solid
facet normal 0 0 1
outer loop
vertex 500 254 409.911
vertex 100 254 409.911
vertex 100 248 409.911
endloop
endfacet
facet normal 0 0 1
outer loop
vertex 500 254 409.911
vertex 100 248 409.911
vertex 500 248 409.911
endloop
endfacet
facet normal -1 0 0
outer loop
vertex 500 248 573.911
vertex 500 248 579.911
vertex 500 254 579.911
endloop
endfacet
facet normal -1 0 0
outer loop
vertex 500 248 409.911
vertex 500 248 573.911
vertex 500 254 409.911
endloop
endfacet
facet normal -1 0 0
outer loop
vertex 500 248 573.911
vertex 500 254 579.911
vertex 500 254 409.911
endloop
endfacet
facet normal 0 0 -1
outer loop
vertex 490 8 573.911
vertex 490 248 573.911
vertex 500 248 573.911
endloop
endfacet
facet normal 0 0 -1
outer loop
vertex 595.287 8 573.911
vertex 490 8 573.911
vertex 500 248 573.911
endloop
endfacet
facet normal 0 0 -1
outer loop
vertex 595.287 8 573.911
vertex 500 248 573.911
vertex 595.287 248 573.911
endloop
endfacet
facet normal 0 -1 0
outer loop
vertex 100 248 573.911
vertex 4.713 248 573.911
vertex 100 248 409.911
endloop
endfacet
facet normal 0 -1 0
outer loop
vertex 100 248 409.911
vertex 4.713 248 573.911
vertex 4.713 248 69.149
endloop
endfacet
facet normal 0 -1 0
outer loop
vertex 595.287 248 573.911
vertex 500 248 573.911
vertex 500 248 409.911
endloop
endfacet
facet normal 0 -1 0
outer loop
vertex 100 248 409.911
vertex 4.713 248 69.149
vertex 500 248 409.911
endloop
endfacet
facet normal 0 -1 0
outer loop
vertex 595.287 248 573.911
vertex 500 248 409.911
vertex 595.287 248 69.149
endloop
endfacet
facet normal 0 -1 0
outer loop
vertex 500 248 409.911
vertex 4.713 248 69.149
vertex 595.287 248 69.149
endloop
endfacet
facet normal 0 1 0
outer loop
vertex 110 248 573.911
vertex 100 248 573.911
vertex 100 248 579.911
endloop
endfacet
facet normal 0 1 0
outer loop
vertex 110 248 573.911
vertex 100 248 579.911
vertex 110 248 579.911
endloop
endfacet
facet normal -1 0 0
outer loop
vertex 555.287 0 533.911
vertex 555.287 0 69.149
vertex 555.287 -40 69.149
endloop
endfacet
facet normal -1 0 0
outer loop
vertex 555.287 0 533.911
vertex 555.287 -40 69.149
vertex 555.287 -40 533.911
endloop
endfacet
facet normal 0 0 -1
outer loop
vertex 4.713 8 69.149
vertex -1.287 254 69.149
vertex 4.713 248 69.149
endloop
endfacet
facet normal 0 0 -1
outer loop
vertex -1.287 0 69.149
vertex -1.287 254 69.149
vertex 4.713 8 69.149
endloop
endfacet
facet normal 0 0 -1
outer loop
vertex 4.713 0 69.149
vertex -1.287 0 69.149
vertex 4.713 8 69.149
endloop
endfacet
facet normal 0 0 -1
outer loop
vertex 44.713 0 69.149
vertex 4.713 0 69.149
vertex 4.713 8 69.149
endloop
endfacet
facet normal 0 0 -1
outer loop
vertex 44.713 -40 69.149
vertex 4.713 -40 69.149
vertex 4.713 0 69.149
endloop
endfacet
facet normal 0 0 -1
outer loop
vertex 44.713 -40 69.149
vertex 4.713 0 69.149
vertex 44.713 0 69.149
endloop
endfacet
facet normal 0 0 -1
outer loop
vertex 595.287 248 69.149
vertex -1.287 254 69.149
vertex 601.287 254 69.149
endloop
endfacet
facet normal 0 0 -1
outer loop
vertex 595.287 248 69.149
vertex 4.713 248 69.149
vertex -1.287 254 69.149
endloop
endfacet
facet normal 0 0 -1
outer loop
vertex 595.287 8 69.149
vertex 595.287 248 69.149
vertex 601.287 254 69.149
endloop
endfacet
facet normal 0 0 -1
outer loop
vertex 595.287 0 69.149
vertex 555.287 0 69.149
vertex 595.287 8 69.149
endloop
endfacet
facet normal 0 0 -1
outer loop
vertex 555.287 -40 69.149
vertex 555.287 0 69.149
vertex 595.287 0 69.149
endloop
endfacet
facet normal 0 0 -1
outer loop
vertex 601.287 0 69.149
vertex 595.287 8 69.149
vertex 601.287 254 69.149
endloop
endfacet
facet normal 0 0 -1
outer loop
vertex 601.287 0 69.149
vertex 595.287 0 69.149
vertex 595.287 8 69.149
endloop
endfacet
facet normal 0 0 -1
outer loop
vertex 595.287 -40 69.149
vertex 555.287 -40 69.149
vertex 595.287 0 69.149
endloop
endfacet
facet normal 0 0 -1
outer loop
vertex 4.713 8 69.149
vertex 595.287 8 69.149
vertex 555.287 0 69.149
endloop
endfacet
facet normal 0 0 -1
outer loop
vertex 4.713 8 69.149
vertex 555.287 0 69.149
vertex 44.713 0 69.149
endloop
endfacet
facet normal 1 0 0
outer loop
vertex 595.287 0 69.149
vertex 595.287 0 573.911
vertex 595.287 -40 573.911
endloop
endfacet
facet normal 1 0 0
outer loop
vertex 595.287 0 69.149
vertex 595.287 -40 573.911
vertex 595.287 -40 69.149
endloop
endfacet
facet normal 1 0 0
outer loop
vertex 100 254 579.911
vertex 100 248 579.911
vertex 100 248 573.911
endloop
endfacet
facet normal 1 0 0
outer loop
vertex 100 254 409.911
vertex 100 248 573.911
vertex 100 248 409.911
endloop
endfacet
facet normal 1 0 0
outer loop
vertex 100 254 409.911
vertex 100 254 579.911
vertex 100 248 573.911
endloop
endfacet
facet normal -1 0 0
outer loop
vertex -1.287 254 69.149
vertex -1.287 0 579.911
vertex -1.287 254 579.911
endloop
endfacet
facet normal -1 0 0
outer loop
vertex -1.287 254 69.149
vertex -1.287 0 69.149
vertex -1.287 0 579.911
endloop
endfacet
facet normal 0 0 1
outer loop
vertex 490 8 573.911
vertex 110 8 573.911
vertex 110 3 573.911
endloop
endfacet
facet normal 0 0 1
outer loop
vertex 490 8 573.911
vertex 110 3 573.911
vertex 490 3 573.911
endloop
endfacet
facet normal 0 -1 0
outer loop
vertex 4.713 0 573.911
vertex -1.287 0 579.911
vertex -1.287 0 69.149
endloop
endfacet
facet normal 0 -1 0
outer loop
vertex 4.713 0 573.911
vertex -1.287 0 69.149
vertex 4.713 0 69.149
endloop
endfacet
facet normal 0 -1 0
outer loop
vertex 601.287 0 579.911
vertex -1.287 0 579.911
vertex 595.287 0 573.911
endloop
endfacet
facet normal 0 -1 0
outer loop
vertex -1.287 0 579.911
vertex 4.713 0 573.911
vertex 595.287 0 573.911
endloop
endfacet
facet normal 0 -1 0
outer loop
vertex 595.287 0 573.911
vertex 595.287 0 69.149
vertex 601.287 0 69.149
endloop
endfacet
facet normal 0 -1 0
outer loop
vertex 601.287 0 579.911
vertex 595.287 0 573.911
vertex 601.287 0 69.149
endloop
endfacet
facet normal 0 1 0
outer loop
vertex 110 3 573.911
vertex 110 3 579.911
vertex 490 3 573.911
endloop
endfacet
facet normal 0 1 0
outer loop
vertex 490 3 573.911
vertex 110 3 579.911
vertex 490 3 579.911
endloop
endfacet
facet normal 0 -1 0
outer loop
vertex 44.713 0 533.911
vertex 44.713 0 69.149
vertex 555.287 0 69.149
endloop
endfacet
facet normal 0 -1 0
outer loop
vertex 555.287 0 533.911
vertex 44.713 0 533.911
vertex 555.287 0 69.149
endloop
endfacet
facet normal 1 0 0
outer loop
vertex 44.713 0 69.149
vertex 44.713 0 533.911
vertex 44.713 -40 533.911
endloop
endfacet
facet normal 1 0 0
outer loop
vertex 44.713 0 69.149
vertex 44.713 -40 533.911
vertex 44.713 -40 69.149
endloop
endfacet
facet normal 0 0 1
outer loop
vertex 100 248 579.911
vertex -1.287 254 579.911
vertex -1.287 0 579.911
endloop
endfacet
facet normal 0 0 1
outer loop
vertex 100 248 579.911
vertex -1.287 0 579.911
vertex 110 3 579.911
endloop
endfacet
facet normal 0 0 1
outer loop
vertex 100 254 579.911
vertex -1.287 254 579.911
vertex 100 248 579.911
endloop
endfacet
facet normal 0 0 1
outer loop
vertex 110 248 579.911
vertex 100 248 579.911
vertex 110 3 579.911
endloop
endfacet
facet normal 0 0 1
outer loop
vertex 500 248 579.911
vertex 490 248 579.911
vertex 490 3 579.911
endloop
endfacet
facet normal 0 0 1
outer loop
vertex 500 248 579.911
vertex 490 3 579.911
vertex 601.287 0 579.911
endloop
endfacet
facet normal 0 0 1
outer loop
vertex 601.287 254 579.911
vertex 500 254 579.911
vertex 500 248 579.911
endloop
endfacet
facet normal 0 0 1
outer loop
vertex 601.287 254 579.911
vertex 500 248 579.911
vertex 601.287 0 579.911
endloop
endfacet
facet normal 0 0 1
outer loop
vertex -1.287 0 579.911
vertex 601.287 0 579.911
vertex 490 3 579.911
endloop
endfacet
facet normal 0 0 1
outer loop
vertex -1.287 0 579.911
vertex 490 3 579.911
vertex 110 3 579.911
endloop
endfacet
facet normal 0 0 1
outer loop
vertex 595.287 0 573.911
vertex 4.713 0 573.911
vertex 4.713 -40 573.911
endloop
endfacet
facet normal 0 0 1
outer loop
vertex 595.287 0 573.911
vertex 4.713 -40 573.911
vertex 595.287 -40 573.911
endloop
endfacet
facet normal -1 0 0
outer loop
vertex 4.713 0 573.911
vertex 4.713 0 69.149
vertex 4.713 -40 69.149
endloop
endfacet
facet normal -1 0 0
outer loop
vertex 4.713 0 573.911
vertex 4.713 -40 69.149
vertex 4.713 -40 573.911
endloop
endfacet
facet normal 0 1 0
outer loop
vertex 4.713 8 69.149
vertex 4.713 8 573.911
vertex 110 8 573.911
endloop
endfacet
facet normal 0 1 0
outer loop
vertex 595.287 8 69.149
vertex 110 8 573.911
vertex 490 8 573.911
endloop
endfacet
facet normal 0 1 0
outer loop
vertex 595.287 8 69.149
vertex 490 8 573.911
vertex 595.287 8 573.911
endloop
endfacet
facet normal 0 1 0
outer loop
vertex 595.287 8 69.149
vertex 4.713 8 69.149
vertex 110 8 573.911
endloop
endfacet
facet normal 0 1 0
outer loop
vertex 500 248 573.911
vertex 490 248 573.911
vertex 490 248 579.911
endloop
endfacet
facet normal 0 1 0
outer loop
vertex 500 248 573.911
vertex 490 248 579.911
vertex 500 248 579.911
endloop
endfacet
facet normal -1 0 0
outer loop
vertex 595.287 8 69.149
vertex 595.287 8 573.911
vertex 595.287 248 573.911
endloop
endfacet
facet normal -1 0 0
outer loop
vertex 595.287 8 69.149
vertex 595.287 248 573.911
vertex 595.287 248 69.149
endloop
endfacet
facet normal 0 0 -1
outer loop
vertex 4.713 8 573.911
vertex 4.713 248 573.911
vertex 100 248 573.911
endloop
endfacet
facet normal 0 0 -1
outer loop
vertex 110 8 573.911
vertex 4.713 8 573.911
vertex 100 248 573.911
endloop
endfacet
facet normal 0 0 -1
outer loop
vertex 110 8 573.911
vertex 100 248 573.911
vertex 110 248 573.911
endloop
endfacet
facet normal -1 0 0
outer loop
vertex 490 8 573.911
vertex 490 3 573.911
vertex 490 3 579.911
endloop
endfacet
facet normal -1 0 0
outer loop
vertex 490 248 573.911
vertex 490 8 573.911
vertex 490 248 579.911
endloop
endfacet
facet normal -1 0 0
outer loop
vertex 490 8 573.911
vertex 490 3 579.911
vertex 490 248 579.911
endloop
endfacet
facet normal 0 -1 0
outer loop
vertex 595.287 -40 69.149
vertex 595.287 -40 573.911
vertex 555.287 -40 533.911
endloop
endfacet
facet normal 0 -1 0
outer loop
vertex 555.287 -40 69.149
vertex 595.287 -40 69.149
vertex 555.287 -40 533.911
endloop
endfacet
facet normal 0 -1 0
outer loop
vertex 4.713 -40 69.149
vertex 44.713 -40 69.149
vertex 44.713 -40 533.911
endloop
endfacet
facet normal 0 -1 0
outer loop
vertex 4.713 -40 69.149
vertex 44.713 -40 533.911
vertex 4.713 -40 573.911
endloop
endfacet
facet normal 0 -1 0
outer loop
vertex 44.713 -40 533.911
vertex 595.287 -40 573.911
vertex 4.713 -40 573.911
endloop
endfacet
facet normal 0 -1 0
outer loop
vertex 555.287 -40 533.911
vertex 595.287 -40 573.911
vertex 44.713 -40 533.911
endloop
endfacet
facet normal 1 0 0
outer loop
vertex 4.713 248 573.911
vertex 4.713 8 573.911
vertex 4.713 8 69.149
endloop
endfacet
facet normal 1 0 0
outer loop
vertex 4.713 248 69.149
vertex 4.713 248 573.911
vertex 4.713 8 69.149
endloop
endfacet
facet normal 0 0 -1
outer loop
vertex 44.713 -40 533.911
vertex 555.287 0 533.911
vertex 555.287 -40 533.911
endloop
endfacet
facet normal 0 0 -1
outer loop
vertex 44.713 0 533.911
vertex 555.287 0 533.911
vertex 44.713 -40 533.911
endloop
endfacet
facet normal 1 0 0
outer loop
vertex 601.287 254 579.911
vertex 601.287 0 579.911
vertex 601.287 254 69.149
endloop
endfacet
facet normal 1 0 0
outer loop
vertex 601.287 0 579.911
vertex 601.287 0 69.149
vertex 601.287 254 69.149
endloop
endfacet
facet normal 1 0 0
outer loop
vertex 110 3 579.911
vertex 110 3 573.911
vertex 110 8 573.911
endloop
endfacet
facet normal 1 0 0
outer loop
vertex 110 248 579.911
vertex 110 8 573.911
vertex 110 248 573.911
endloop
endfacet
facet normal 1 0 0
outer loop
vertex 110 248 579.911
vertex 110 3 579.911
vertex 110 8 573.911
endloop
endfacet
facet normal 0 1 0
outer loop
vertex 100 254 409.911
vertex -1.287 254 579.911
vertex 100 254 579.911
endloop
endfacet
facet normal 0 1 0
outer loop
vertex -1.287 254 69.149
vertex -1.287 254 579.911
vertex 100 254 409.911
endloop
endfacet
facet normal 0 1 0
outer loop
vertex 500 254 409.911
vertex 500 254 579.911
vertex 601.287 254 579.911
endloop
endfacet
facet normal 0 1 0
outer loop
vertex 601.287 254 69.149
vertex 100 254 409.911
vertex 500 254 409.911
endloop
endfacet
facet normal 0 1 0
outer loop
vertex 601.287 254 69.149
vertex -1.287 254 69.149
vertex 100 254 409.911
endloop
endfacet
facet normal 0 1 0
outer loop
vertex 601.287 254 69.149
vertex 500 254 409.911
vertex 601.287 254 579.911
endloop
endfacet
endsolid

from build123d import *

# Parameters (mm, degrees)
SKETCH_1_W          = 602.574462866
SKETCH_1_H          = 504.761774505
EXTRUDE_1_DEPTH     = 8
SKETCH_2_W          = 6
SKETCH_2_H          = 504.761774505
EXTRUDE_2_DEPTH     = 240
SKETCH_3_W          = 602.574462866
SKETCH_3_H          = 504.761774505
EXTRUDE_3_DEPTH     = 6
SKETCH_5_W          = 602.574462866
SKETCH_5_H          = 254
EXTRUDE_4_DEPTH     = 6
SKETCH_4_W          = 400
SKETCH_4_H          = 170
CUT_EXTRUDE_4_DEPTH = 6
SKETCH_9_W          = 380
SKETCH_9_H          = 245
CUT_EXTRUDE_5_DEPTH = 6
EXTRUDE_8_DEPTH     = 40


with BuildPart() as part:
    # Эскиз1 → Бобышка-Вытянуть1 (new body)
    with BuildSketch(Plane(origin=(0, 0, 0), x_dir=(1, 0, 0), z_dir=(0, 1, 0))):
        with Locations((300, -321.529892077)):
            Rectangle(SKETCH_1_W, SKETCH_1_H)
    extrude(amount=EXTRUDE_1_DEPTH)

    # Эскиз2 → Бобышка-Вытянуть2 (add)
    with BuildSketch(Plane(origin=(0, 8, 0), x_dir=(1, 0, 0), z_dir=(0, 1, 0))):
        with Locations((1.712768567, -321.529892077)):
            Rectangle(SKETCH_2_W, SKETCH_2_H)
        with Locations((598.287231433, -321.529892077)):
            Rectangle(SKETCH_2_W, SKETCH_2_H)
    extrude(amount=EXTRUDE_2_DEPTH)

    # Эскиз3 → Бобышка-Вытянуть3 (add)
    with BuildSketch(Plane(origin=(0, 248, 0), x_dir=(1, 0, 0), z_dir=(0, 1, 0))):
        with Locations((300, -321.529892077)):
            Rectangle(SKETCH_3_W, SKETCH_3_H)
    extrude(amount=EXTRUDE_3_DEPTH)

    # Эскиз5 → Бобышка-Вытянуть4 (add)
    with BuildSketch(Plane.XY.offset(573.910779329)):
        with Locations((300, 127)):
            Rectangle(SKETCH_5_W, SKETCH_5_H)
    extrude(amount=EXTRUDE_4_DEPTH)

    # Эскиз4 → Вырез-Вытянуть4 (cut)
    with BuildSketch(Plane(origin=(0, 254, 0), x_dir=(1, 0, 0), z_dir=(0, 1, 0))):
        with Locations((300, -494.910779329)):
            Rectangle(SKETCH_4_W, SKETCH_4_H)
    extrude(amount=-CUT_EXTRUDE_4_DEPTH, mode=Mode.SUBTRACT)

    # Эскиз9 → Вырез-Вытянуть5 (cut)
    with BuildSketch(Plane.XY.offset(579.910779329)):
        with Locations((300, 125.5)):
            Rectangle(SKETCH_9_W, SKETCH_9_H)
    extrude(amount=-CUT_EXTRUDE_5_DEPTH, mode=Mode.SUBTRACT)

    # Эскиз12 → Бобышка-Вытянуть8 (add)
    with BuildSketch(Plane.XZ):
        Polygon((4.712768567, 573.910779329), (595.287231433, 573.910779329), (595.287231433, 69.149004824), (555.287231433, 69.149004824), (555.287231433, 533.910779329), (44.712768567, 533.910779329), (44.712768567, 69.149004824), (4.712768567, 69.149004824), align=None)
    extrude(amount=EXTRUDE_8_DEPTH)


solid = part.part
